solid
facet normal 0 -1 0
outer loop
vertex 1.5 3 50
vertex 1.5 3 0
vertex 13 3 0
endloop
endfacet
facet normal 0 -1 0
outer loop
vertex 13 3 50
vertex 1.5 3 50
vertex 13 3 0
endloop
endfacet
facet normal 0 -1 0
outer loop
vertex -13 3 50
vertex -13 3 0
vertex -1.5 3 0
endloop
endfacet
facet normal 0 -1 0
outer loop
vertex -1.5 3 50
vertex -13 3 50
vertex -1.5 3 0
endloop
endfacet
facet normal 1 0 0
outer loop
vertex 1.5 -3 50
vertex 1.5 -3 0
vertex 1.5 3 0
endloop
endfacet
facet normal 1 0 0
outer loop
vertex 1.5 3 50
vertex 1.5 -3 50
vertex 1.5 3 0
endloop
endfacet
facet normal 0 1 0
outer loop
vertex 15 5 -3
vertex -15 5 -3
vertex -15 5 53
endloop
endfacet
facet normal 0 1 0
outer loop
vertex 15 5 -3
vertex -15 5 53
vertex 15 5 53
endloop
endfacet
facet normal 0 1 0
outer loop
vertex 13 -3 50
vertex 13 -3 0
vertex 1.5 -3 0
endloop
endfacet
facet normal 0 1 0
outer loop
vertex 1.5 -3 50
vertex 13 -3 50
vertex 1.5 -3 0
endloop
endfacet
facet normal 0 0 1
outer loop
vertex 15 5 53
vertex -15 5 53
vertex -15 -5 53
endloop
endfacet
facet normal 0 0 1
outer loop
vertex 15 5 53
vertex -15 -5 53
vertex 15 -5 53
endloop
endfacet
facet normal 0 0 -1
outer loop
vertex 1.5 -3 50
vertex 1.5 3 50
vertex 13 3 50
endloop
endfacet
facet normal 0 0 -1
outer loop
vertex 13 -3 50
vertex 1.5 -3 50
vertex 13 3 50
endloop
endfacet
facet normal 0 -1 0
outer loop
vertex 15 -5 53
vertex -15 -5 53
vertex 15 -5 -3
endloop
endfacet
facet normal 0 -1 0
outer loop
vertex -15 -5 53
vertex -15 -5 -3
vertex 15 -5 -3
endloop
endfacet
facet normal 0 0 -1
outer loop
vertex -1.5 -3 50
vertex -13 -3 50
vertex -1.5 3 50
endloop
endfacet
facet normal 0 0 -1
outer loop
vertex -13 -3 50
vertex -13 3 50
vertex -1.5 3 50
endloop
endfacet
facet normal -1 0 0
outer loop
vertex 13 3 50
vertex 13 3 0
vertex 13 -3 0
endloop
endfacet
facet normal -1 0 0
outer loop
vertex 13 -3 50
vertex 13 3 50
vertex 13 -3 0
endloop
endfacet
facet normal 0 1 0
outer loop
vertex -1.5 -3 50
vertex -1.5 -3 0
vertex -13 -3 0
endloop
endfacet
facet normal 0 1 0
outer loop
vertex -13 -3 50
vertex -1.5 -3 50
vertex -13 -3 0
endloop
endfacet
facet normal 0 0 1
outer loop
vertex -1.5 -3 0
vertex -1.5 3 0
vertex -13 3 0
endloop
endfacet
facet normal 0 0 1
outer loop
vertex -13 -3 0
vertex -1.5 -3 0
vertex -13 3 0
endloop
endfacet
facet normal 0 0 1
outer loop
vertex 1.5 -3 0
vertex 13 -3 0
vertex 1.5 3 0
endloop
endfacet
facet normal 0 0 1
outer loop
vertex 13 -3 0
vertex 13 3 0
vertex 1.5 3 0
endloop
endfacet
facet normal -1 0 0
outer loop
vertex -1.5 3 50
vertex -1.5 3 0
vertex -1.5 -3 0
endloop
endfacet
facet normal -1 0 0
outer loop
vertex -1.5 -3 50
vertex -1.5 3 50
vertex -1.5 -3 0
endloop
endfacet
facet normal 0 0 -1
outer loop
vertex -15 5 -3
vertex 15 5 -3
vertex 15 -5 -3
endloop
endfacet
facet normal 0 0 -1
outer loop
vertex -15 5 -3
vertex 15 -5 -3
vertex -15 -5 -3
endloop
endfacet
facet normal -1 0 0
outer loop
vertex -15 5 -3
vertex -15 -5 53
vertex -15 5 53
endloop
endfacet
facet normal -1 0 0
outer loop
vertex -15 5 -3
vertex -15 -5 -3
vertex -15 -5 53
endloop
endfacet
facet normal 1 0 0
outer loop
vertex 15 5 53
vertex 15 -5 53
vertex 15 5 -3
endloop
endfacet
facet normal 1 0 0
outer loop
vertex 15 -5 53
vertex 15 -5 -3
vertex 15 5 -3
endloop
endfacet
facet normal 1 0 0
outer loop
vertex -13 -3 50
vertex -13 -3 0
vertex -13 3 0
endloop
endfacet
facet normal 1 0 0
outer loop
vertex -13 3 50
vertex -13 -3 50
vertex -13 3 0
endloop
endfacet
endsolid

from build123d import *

# Parameters (mm, degrees)
EXTRUDE_1_DEPTH = 50
SKETCH_20_W     = 30
SKETCH_20_H     = 10
EXTRUDE_2_DEPTH = 3
SKETCH_21_W     = 30
SKETCH_21_H     = 10
EXTRUDE_3_DEPTH = 3


with BuildPart() as part:
    # 草图1 → 凸台-拉伸1 (new body)
    with BuildSketch(Plane.XY):
        Polygon((-1.5, -3), (-13, -3), (-13, 3), (-1.5, 3), (-1.5, 5), (-15, 5), (-15, -5), (-1.5, -5), align=None)
        Polygon((-1.5, 3), (-1.5, -3), (-1.5, -5), (1.5, -5), (1.5, -3), (1.5, 3), (1.5, 5), (-1.5, 5), align=None)
        Polygon((1.5, -3), (1.5, -5), (15, -5), (15, 5), (1.5, 5), (1.5, 3), (13, 3), (13, -3), align=None)
    extrude(amount=EXTRUDE_1_DEPTH)

    # 草图20 → 凸台-拉伸2 (add)
    with BuildSketch(Plane(origin=(0, 0, 0), x_dir=(-1, 0, 0), z_dir=(0, 0, -1))):
        Rectangle(SKETCH_20_W, SKETCH_20_H)
    extrude(amount=EXTRUDE_2_DEPTH)

    # 草图21 → 凸台-拉伸3 (add)
    with BuildSketch(Plane.XY.offset(50)):
        Rectangle(SKETCH_21_W, SKETCH_21_H)
    extrude(amount=EXTRUDE_3_DEPTH)


solid = part.part
